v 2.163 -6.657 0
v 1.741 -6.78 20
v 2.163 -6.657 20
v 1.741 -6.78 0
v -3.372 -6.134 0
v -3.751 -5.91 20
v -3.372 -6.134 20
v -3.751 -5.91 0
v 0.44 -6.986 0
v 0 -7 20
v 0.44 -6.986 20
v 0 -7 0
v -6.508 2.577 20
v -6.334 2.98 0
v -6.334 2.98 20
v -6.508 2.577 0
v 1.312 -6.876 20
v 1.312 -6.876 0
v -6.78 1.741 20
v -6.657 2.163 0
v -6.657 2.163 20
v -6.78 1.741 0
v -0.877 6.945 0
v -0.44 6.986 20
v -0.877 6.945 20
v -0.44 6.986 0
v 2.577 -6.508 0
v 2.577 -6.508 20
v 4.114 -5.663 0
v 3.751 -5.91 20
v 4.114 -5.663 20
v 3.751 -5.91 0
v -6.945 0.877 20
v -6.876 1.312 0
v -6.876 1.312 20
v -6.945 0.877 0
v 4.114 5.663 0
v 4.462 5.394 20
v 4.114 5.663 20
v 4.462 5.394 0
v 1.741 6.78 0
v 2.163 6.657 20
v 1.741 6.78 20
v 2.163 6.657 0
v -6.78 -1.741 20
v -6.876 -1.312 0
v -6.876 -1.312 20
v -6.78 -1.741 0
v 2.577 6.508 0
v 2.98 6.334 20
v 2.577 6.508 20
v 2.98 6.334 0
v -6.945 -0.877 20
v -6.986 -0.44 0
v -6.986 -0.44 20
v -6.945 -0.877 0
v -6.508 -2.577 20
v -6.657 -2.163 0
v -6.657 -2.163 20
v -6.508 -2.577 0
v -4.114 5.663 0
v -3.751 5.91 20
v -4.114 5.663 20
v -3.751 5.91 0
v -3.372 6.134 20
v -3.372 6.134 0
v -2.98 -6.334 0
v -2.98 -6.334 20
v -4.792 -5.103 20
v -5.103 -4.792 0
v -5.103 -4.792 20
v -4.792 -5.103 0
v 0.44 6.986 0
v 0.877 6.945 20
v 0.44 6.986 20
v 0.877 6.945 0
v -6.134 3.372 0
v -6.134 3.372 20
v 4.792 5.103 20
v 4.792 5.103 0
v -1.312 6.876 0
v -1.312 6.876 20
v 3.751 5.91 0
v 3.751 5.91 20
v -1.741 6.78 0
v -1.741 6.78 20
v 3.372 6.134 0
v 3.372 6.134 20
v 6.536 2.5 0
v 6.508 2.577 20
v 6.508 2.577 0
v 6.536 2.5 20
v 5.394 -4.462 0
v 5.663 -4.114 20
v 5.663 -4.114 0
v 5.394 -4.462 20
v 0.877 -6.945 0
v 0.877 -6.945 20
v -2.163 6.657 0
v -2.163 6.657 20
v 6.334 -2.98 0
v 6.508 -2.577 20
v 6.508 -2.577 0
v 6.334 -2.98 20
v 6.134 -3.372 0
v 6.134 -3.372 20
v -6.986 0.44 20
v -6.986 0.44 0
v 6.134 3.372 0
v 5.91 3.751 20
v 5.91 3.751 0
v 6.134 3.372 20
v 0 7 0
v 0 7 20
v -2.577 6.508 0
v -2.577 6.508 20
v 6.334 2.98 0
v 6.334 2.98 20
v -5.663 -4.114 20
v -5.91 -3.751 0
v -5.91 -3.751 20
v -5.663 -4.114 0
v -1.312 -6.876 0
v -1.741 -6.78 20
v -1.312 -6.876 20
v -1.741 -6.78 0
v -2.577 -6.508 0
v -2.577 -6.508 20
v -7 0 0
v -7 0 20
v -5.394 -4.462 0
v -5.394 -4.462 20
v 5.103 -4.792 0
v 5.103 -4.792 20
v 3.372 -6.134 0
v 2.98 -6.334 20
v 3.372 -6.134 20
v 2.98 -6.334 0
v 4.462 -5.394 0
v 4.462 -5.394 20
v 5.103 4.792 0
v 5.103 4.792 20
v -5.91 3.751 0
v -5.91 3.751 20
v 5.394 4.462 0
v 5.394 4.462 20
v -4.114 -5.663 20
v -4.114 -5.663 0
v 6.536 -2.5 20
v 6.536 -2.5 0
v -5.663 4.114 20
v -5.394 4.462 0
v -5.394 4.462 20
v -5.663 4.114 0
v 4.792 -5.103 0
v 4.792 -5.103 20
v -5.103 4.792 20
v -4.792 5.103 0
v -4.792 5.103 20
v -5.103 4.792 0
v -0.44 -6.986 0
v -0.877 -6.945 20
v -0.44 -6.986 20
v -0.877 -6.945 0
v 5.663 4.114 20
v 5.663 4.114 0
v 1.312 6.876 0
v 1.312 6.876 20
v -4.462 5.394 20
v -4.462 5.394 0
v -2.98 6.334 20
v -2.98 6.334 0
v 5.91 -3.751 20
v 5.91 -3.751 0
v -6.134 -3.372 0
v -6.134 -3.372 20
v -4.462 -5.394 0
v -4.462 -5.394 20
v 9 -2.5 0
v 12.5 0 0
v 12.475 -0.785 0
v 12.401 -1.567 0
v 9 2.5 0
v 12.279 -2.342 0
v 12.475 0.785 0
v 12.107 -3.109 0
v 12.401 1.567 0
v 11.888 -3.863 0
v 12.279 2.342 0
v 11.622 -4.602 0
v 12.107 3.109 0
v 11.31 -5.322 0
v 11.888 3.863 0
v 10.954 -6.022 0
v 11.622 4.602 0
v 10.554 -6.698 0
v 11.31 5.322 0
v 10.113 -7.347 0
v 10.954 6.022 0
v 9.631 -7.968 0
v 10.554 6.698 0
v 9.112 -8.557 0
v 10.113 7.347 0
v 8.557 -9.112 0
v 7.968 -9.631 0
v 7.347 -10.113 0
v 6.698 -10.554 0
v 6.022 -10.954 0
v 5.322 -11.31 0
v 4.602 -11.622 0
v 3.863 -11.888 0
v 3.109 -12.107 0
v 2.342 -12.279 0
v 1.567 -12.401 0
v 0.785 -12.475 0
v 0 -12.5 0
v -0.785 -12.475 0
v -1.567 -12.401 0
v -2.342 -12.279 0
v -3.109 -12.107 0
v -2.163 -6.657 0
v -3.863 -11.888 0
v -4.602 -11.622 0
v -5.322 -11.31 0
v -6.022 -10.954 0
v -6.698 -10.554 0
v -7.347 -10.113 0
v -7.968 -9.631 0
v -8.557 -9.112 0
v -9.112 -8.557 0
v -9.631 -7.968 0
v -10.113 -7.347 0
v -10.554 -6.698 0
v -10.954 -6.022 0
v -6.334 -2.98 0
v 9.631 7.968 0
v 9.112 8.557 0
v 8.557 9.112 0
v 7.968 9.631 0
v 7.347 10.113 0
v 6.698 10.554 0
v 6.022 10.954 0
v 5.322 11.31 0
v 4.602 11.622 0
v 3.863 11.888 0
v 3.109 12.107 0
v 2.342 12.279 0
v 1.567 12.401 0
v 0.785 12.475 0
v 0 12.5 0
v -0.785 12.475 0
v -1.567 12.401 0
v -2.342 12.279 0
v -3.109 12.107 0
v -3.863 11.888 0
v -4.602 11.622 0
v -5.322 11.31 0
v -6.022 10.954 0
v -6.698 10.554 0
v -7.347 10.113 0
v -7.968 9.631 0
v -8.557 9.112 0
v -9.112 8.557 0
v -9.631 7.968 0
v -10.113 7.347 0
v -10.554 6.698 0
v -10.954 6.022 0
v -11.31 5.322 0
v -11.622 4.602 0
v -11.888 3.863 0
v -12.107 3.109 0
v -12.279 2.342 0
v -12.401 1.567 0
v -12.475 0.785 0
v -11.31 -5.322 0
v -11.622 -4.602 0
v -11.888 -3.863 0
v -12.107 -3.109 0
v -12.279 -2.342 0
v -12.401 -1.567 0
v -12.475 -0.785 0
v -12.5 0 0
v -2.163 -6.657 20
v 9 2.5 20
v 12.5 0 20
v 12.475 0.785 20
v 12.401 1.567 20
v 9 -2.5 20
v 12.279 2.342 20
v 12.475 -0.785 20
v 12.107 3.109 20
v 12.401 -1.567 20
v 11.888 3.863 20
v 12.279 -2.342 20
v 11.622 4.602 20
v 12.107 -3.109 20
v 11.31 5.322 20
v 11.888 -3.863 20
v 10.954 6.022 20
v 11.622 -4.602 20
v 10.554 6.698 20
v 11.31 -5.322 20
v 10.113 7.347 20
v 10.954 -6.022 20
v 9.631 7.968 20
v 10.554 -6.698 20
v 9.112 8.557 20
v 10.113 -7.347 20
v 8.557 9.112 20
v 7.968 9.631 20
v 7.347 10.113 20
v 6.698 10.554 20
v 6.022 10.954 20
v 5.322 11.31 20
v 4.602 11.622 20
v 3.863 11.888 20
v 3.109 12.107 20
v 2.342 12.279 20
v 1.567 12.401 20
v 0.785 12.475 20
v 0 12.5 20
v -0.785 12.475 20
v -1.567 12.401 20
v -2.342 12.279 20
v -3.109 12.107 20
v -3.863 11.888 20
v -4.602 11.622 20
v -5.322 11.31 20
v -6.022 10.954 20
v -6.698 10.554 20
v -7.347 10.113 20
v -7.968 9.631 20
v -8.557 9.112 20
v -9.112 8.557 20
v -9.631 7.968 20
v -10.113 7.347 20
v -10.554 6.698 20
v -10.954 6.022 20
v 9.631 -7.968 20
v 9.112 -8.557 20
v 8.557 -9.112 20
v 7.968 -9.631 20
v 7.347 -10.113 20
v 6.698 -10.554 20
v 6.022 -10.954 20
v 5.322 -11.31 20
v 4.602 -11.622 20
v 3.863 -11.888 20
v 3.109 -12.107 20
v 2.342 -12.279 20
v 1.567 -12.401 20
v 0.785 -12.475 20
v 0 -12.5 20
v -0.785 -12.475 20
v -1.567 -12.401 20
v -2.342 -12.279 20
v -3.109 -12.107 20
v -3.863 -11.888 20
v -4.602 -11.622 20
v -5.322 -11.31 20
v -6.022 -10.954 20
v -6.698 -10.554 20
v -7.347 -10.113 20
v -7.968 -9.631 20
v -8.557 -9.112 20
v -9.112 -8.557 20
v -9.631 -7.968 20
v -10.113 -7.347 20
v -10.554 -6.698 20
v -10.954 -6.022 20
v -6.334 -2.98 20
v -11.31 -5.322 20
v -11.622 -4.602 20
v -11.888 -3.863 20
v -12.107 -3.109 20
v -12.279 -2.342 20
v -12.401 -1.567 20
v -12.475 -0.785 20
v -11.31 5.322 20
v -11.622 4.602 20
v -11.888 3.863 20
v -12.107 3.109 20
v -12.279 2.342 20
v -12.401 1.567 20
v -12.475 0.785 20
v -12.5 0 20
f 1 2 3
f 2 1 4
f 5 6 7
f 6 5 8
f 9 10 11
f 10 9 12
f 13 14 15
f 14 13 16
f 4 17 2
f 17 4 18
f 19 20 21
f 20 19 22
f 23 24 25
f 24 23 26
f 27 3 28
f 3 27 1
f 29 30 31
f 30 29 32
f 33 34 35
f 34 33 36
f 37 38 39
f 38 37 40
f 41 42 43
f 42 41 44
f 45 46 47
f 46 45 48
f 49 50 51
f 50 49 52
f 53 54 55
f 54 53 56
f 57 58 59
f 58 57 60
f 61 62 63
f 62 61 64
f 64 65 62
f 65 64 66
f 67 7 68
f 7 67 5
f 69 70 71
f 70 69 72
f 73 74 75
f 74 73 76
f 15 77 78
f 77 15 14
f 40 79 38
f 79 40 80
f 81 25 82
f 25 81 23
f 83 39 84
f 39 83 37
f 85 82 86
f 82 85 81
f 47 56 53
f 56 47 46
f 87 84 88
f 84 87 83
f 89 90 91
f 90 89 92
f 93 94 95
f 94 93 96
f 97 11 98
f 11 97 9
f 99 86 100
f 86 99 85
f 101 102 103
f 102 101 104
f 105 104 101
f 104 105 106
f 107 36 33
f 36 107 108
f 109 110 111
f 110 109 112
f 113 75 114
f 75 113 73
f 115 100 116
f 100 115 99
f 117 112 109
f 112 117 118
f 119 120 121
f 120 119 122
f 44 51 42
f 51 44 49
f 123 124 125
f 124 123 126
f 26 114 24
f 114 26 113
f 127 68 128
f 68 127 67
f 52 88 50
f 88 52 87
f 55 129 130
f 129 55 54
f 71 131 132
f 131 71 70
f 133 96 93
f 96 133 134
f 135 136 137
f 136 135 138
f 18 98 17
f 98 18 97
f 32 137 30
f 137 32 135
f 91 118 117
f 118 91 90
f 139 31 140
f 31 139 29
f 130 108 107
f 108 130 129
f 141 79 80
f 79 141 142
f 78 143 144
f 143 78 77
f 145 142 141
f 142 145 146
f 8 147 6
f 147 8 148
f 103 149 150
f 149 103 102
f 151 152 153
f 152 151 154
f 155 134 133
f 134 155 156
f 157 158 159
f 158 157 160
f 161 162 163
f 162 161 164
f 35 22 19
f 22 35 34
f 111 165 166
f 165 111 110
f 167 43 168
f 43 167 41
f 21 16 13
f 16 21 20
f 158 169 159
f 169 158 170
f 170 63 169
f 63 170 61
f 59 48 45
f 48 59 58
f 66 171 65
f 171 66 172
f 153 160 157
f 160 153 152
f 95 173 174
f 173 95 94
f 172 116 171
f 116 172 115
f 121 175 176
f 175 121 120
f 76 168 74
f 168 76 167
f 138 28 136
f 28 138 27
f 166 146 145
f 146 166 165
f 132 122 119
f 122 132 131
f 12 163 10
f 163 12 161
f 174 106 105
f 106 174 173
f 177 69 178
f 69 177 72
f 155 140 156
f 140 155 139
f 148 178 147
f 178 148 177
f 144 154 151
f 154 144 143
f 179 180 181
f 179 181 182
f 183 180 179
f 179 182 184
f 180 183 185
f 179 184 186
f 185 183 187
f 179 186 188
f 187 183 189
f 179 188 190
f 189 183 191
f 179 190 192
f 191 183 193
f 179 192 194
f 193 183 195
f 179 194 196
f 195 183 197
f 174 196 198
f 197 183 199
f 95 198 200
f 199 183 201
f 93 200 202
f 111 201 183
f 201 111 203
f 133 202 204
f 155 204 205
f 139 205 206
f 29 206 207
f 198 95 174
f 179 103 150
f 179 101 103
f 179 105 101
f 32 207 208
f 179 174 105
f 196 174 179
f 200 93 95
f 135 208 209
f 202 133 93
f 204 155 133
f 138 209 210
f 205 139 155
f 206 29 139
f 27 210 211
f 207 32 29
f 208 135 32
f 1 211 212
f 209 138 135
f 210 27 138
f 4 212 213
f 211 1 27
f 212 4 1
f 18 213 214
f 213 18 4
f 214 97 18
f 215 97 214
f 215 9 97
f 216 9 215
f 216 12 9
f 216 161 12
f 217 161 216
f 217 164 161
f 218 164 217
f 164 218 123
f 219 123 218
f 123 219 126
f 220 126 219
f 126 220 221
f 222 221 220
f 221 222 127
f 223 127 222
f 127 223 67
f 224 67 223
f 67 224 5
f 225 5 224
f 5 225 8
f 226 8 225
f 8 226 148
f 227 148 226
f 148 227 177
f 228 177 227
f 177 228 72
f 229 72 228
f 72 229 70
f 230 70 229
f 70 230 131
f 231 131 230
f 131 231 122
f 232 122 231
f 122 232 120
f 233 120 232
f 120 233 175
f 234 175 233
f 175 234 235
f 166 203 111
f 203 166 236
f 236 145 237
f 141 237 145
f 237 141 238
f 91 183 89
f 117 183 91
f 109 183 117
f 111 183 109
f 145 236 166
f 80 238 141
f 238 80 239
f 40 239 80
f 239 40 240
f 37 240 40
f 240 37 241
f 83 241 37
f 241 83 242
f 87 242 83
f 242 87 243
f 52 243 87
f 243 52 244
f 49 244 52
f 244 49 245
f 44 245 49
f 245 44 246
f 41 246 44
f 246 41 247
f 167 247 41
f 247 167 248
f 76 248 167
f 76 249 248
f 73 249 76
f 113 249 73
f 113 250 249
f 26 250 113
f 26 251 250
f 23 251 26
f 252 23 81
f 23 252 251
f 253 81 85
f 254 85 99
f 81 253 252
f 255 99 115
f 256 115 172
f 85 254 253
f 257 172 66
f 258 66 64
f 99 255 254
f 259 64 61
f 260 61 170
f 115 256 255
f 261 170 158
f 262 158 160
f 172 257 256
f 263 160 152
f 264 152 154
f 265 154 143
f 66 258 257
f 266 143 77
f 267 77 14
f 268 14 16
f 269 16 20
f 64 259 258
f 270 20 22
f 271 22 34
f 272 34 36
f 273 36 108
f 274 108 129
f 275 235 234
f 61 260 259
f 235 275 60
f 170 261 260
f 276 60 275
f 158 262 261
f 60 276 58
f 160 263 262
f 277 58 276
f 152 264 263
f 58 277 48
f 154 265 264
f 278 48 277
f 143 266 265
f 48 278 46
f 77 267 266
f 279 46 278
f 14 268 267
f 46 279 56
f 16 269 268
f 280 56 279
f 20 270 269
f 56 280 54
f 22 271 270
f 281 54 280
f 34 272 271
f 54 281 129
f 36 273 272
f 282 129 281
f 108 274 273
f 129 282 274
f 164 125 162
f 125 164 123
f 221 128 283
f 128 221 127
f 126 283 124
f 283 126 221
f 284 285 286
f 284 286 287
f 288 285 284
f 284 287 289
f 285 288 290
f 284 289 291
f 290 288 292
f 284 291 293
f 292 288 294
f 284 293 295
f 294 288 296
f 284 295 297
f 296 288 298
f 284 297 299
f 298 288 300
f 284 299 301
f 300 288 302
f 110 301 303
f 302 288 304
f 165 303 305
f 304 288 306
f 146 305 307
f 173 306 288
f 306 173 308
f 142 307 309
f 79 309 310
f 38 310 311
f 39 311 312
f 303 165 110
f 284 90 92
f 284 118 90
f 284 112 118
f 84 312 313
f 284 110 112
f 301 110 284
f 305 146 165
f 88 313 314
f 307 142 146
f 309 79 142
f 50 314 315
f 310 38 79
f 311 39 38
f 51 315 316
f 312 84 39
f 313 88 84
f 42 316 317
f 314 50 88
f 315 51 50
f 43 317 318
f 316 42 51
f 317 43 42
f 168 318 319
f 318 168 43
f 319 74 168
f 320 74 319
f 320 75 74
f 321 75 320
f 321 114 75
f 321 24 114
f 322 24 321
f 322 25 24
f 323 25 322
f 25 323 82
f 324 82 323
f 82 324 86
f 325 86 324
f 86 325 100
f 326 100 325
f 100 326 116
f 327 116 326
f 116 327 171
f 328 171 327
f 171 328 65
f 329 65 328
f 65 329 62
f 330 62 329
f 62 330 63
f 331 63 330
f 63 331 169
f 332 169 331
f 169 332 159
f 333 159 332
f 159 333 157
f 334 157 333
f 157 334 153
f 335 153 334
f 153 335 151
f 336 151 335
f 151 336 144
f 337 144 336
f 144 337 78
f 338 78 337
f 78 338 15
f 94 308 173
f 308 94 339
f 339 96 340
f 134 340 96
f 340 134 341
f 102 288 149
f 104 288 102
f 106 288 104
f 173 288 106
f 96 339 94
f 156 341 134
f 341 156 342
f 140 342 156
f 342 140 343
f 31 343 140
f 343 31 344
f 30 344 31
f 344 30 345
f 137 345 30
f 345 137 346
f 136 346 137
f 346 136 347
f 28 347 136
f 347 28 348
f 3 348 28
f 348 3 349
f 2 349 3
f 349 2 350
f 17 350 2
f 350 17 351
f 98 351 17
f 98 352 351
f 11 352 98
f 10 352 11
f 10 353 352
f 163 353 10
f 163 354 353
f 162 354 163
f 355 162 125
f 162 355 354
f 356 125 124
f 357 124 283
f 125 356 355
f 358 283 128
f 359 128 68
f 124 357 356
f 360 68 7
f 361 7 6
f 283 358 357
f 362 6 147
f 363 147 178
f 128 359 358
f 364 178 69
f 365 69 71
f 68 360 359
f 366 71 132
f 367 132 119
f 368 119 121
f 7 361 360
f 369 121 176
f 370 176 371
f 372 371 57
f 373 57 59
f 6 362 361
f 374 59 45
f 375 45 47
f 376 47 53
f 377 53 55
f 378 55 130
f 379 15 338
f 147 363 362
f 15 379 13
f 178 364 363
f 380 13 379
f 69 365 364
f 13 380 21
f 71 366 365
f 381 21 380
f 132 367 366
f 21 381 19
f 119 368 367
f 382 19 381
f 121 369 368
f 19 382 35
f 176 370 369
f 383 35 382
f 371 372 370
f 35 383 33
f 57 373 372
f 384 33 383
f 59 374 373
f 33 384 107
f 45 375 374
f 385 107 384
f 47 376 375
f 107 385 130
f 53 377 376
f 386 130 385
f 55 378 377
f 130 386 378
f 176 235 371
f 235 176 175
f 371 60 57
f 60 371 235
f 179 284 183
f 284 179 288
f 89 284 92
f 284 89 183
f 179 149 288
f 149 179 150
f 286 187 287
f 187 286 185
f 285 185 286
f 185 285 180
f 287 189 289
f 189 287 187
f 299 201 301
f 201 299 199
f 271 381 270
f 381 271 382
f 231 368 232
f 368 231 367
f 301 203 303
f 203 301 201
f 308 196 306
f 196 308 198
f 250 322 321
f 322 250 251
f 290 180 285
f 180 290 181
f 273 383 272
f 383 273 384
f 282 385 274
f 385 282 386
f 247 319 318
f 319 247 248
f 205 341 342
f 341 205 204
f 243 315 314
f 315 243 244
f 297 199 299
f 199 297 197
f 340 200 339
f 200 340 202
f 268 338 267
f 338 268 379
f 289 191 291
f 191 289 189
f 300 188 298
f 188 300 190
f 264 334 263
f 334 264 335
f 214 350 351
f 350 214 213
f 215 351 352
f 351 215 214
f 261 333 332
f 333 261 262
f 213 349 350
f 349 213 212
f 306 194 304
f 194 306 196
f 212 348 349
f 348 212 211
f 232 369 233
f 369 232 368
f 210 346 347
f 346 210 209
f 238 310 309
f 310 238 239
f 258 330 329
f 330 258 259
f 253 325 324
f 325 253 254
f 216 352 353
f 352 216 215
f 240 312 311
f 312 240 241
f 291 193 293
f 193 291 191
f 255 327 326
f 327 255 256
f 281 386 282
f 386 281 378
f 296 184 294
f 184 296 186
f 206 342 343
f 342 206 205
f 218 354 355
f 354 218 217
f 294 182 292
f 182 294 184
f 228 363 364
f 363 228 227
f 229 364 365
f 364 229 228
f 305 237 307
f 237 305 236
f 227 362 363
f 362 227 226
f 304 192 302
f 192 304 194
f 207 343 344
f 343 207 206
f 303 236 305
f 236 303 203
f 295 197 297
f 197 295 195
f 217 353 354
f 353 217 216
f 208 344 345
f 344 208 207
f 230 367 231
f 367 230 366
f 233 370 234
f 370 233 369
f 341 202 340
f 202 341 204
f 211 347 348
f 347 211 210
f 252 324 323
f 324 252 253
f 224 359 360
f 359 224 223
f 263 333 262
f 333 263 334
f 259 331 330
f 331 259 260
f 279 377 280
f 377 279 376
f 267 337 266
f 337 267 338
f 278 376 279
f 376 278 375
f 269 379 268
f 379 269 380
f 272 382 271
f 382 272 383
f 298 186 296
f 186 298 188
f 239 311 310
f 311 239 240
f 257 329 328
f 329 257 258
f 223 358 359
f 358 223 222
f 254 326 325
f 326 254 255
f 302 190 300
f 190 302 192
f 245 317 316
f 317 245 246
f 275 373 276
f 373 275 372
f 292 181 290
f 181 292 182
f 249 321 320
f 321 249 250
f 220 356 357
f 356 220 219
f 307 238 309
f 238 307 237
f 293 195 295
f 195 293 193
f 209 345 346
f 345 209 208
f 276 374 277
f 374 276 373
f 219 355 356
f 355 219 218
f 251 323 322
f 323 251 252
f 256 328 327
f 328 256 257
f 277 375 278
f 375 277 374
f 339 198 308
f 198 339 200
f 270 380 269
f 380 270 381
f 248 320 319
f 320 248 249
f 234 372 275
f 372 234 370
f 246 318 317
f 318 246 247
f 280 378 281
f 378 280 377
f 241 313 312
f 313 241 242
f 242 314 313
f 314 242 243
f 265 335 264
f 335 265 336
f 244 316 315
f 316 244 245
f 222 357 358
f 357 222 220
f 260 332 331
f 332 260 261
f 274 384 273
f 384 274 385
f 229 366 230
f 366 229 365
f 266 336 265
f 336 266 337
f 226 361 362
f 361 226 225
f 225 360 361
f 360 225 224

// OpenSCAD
/*
This documentation describes Open Hardware and is licensed under the CERN OHL v. 1.2.

You may redistribute and modify this documentation under the terms of the
CERN OHL v.1.2. (http://ohwr.org/cernohl). This documentation is distributed
WITHOUT   ANY   EXPRESS   OR   IMPLIED   WARRANTY,   INCLUDING   OF
MERCHANTABILITY,   SATISFACTORY   QUALITY   AND   FITNESS   FOR   A
PARTICULAR   PURPOSE.   Please   see   the   CERN   OHL   v.1.2  for   applicable
conditions.
*/

difference() {
    cylinder(d=25, h=20, $fn=100);

    union() {
        cylinder(d=14, h=20, $fn=100);
        translate([((14/2)-5)+2,-2.5,0])
        cube([5,5,20]);
    }
}
